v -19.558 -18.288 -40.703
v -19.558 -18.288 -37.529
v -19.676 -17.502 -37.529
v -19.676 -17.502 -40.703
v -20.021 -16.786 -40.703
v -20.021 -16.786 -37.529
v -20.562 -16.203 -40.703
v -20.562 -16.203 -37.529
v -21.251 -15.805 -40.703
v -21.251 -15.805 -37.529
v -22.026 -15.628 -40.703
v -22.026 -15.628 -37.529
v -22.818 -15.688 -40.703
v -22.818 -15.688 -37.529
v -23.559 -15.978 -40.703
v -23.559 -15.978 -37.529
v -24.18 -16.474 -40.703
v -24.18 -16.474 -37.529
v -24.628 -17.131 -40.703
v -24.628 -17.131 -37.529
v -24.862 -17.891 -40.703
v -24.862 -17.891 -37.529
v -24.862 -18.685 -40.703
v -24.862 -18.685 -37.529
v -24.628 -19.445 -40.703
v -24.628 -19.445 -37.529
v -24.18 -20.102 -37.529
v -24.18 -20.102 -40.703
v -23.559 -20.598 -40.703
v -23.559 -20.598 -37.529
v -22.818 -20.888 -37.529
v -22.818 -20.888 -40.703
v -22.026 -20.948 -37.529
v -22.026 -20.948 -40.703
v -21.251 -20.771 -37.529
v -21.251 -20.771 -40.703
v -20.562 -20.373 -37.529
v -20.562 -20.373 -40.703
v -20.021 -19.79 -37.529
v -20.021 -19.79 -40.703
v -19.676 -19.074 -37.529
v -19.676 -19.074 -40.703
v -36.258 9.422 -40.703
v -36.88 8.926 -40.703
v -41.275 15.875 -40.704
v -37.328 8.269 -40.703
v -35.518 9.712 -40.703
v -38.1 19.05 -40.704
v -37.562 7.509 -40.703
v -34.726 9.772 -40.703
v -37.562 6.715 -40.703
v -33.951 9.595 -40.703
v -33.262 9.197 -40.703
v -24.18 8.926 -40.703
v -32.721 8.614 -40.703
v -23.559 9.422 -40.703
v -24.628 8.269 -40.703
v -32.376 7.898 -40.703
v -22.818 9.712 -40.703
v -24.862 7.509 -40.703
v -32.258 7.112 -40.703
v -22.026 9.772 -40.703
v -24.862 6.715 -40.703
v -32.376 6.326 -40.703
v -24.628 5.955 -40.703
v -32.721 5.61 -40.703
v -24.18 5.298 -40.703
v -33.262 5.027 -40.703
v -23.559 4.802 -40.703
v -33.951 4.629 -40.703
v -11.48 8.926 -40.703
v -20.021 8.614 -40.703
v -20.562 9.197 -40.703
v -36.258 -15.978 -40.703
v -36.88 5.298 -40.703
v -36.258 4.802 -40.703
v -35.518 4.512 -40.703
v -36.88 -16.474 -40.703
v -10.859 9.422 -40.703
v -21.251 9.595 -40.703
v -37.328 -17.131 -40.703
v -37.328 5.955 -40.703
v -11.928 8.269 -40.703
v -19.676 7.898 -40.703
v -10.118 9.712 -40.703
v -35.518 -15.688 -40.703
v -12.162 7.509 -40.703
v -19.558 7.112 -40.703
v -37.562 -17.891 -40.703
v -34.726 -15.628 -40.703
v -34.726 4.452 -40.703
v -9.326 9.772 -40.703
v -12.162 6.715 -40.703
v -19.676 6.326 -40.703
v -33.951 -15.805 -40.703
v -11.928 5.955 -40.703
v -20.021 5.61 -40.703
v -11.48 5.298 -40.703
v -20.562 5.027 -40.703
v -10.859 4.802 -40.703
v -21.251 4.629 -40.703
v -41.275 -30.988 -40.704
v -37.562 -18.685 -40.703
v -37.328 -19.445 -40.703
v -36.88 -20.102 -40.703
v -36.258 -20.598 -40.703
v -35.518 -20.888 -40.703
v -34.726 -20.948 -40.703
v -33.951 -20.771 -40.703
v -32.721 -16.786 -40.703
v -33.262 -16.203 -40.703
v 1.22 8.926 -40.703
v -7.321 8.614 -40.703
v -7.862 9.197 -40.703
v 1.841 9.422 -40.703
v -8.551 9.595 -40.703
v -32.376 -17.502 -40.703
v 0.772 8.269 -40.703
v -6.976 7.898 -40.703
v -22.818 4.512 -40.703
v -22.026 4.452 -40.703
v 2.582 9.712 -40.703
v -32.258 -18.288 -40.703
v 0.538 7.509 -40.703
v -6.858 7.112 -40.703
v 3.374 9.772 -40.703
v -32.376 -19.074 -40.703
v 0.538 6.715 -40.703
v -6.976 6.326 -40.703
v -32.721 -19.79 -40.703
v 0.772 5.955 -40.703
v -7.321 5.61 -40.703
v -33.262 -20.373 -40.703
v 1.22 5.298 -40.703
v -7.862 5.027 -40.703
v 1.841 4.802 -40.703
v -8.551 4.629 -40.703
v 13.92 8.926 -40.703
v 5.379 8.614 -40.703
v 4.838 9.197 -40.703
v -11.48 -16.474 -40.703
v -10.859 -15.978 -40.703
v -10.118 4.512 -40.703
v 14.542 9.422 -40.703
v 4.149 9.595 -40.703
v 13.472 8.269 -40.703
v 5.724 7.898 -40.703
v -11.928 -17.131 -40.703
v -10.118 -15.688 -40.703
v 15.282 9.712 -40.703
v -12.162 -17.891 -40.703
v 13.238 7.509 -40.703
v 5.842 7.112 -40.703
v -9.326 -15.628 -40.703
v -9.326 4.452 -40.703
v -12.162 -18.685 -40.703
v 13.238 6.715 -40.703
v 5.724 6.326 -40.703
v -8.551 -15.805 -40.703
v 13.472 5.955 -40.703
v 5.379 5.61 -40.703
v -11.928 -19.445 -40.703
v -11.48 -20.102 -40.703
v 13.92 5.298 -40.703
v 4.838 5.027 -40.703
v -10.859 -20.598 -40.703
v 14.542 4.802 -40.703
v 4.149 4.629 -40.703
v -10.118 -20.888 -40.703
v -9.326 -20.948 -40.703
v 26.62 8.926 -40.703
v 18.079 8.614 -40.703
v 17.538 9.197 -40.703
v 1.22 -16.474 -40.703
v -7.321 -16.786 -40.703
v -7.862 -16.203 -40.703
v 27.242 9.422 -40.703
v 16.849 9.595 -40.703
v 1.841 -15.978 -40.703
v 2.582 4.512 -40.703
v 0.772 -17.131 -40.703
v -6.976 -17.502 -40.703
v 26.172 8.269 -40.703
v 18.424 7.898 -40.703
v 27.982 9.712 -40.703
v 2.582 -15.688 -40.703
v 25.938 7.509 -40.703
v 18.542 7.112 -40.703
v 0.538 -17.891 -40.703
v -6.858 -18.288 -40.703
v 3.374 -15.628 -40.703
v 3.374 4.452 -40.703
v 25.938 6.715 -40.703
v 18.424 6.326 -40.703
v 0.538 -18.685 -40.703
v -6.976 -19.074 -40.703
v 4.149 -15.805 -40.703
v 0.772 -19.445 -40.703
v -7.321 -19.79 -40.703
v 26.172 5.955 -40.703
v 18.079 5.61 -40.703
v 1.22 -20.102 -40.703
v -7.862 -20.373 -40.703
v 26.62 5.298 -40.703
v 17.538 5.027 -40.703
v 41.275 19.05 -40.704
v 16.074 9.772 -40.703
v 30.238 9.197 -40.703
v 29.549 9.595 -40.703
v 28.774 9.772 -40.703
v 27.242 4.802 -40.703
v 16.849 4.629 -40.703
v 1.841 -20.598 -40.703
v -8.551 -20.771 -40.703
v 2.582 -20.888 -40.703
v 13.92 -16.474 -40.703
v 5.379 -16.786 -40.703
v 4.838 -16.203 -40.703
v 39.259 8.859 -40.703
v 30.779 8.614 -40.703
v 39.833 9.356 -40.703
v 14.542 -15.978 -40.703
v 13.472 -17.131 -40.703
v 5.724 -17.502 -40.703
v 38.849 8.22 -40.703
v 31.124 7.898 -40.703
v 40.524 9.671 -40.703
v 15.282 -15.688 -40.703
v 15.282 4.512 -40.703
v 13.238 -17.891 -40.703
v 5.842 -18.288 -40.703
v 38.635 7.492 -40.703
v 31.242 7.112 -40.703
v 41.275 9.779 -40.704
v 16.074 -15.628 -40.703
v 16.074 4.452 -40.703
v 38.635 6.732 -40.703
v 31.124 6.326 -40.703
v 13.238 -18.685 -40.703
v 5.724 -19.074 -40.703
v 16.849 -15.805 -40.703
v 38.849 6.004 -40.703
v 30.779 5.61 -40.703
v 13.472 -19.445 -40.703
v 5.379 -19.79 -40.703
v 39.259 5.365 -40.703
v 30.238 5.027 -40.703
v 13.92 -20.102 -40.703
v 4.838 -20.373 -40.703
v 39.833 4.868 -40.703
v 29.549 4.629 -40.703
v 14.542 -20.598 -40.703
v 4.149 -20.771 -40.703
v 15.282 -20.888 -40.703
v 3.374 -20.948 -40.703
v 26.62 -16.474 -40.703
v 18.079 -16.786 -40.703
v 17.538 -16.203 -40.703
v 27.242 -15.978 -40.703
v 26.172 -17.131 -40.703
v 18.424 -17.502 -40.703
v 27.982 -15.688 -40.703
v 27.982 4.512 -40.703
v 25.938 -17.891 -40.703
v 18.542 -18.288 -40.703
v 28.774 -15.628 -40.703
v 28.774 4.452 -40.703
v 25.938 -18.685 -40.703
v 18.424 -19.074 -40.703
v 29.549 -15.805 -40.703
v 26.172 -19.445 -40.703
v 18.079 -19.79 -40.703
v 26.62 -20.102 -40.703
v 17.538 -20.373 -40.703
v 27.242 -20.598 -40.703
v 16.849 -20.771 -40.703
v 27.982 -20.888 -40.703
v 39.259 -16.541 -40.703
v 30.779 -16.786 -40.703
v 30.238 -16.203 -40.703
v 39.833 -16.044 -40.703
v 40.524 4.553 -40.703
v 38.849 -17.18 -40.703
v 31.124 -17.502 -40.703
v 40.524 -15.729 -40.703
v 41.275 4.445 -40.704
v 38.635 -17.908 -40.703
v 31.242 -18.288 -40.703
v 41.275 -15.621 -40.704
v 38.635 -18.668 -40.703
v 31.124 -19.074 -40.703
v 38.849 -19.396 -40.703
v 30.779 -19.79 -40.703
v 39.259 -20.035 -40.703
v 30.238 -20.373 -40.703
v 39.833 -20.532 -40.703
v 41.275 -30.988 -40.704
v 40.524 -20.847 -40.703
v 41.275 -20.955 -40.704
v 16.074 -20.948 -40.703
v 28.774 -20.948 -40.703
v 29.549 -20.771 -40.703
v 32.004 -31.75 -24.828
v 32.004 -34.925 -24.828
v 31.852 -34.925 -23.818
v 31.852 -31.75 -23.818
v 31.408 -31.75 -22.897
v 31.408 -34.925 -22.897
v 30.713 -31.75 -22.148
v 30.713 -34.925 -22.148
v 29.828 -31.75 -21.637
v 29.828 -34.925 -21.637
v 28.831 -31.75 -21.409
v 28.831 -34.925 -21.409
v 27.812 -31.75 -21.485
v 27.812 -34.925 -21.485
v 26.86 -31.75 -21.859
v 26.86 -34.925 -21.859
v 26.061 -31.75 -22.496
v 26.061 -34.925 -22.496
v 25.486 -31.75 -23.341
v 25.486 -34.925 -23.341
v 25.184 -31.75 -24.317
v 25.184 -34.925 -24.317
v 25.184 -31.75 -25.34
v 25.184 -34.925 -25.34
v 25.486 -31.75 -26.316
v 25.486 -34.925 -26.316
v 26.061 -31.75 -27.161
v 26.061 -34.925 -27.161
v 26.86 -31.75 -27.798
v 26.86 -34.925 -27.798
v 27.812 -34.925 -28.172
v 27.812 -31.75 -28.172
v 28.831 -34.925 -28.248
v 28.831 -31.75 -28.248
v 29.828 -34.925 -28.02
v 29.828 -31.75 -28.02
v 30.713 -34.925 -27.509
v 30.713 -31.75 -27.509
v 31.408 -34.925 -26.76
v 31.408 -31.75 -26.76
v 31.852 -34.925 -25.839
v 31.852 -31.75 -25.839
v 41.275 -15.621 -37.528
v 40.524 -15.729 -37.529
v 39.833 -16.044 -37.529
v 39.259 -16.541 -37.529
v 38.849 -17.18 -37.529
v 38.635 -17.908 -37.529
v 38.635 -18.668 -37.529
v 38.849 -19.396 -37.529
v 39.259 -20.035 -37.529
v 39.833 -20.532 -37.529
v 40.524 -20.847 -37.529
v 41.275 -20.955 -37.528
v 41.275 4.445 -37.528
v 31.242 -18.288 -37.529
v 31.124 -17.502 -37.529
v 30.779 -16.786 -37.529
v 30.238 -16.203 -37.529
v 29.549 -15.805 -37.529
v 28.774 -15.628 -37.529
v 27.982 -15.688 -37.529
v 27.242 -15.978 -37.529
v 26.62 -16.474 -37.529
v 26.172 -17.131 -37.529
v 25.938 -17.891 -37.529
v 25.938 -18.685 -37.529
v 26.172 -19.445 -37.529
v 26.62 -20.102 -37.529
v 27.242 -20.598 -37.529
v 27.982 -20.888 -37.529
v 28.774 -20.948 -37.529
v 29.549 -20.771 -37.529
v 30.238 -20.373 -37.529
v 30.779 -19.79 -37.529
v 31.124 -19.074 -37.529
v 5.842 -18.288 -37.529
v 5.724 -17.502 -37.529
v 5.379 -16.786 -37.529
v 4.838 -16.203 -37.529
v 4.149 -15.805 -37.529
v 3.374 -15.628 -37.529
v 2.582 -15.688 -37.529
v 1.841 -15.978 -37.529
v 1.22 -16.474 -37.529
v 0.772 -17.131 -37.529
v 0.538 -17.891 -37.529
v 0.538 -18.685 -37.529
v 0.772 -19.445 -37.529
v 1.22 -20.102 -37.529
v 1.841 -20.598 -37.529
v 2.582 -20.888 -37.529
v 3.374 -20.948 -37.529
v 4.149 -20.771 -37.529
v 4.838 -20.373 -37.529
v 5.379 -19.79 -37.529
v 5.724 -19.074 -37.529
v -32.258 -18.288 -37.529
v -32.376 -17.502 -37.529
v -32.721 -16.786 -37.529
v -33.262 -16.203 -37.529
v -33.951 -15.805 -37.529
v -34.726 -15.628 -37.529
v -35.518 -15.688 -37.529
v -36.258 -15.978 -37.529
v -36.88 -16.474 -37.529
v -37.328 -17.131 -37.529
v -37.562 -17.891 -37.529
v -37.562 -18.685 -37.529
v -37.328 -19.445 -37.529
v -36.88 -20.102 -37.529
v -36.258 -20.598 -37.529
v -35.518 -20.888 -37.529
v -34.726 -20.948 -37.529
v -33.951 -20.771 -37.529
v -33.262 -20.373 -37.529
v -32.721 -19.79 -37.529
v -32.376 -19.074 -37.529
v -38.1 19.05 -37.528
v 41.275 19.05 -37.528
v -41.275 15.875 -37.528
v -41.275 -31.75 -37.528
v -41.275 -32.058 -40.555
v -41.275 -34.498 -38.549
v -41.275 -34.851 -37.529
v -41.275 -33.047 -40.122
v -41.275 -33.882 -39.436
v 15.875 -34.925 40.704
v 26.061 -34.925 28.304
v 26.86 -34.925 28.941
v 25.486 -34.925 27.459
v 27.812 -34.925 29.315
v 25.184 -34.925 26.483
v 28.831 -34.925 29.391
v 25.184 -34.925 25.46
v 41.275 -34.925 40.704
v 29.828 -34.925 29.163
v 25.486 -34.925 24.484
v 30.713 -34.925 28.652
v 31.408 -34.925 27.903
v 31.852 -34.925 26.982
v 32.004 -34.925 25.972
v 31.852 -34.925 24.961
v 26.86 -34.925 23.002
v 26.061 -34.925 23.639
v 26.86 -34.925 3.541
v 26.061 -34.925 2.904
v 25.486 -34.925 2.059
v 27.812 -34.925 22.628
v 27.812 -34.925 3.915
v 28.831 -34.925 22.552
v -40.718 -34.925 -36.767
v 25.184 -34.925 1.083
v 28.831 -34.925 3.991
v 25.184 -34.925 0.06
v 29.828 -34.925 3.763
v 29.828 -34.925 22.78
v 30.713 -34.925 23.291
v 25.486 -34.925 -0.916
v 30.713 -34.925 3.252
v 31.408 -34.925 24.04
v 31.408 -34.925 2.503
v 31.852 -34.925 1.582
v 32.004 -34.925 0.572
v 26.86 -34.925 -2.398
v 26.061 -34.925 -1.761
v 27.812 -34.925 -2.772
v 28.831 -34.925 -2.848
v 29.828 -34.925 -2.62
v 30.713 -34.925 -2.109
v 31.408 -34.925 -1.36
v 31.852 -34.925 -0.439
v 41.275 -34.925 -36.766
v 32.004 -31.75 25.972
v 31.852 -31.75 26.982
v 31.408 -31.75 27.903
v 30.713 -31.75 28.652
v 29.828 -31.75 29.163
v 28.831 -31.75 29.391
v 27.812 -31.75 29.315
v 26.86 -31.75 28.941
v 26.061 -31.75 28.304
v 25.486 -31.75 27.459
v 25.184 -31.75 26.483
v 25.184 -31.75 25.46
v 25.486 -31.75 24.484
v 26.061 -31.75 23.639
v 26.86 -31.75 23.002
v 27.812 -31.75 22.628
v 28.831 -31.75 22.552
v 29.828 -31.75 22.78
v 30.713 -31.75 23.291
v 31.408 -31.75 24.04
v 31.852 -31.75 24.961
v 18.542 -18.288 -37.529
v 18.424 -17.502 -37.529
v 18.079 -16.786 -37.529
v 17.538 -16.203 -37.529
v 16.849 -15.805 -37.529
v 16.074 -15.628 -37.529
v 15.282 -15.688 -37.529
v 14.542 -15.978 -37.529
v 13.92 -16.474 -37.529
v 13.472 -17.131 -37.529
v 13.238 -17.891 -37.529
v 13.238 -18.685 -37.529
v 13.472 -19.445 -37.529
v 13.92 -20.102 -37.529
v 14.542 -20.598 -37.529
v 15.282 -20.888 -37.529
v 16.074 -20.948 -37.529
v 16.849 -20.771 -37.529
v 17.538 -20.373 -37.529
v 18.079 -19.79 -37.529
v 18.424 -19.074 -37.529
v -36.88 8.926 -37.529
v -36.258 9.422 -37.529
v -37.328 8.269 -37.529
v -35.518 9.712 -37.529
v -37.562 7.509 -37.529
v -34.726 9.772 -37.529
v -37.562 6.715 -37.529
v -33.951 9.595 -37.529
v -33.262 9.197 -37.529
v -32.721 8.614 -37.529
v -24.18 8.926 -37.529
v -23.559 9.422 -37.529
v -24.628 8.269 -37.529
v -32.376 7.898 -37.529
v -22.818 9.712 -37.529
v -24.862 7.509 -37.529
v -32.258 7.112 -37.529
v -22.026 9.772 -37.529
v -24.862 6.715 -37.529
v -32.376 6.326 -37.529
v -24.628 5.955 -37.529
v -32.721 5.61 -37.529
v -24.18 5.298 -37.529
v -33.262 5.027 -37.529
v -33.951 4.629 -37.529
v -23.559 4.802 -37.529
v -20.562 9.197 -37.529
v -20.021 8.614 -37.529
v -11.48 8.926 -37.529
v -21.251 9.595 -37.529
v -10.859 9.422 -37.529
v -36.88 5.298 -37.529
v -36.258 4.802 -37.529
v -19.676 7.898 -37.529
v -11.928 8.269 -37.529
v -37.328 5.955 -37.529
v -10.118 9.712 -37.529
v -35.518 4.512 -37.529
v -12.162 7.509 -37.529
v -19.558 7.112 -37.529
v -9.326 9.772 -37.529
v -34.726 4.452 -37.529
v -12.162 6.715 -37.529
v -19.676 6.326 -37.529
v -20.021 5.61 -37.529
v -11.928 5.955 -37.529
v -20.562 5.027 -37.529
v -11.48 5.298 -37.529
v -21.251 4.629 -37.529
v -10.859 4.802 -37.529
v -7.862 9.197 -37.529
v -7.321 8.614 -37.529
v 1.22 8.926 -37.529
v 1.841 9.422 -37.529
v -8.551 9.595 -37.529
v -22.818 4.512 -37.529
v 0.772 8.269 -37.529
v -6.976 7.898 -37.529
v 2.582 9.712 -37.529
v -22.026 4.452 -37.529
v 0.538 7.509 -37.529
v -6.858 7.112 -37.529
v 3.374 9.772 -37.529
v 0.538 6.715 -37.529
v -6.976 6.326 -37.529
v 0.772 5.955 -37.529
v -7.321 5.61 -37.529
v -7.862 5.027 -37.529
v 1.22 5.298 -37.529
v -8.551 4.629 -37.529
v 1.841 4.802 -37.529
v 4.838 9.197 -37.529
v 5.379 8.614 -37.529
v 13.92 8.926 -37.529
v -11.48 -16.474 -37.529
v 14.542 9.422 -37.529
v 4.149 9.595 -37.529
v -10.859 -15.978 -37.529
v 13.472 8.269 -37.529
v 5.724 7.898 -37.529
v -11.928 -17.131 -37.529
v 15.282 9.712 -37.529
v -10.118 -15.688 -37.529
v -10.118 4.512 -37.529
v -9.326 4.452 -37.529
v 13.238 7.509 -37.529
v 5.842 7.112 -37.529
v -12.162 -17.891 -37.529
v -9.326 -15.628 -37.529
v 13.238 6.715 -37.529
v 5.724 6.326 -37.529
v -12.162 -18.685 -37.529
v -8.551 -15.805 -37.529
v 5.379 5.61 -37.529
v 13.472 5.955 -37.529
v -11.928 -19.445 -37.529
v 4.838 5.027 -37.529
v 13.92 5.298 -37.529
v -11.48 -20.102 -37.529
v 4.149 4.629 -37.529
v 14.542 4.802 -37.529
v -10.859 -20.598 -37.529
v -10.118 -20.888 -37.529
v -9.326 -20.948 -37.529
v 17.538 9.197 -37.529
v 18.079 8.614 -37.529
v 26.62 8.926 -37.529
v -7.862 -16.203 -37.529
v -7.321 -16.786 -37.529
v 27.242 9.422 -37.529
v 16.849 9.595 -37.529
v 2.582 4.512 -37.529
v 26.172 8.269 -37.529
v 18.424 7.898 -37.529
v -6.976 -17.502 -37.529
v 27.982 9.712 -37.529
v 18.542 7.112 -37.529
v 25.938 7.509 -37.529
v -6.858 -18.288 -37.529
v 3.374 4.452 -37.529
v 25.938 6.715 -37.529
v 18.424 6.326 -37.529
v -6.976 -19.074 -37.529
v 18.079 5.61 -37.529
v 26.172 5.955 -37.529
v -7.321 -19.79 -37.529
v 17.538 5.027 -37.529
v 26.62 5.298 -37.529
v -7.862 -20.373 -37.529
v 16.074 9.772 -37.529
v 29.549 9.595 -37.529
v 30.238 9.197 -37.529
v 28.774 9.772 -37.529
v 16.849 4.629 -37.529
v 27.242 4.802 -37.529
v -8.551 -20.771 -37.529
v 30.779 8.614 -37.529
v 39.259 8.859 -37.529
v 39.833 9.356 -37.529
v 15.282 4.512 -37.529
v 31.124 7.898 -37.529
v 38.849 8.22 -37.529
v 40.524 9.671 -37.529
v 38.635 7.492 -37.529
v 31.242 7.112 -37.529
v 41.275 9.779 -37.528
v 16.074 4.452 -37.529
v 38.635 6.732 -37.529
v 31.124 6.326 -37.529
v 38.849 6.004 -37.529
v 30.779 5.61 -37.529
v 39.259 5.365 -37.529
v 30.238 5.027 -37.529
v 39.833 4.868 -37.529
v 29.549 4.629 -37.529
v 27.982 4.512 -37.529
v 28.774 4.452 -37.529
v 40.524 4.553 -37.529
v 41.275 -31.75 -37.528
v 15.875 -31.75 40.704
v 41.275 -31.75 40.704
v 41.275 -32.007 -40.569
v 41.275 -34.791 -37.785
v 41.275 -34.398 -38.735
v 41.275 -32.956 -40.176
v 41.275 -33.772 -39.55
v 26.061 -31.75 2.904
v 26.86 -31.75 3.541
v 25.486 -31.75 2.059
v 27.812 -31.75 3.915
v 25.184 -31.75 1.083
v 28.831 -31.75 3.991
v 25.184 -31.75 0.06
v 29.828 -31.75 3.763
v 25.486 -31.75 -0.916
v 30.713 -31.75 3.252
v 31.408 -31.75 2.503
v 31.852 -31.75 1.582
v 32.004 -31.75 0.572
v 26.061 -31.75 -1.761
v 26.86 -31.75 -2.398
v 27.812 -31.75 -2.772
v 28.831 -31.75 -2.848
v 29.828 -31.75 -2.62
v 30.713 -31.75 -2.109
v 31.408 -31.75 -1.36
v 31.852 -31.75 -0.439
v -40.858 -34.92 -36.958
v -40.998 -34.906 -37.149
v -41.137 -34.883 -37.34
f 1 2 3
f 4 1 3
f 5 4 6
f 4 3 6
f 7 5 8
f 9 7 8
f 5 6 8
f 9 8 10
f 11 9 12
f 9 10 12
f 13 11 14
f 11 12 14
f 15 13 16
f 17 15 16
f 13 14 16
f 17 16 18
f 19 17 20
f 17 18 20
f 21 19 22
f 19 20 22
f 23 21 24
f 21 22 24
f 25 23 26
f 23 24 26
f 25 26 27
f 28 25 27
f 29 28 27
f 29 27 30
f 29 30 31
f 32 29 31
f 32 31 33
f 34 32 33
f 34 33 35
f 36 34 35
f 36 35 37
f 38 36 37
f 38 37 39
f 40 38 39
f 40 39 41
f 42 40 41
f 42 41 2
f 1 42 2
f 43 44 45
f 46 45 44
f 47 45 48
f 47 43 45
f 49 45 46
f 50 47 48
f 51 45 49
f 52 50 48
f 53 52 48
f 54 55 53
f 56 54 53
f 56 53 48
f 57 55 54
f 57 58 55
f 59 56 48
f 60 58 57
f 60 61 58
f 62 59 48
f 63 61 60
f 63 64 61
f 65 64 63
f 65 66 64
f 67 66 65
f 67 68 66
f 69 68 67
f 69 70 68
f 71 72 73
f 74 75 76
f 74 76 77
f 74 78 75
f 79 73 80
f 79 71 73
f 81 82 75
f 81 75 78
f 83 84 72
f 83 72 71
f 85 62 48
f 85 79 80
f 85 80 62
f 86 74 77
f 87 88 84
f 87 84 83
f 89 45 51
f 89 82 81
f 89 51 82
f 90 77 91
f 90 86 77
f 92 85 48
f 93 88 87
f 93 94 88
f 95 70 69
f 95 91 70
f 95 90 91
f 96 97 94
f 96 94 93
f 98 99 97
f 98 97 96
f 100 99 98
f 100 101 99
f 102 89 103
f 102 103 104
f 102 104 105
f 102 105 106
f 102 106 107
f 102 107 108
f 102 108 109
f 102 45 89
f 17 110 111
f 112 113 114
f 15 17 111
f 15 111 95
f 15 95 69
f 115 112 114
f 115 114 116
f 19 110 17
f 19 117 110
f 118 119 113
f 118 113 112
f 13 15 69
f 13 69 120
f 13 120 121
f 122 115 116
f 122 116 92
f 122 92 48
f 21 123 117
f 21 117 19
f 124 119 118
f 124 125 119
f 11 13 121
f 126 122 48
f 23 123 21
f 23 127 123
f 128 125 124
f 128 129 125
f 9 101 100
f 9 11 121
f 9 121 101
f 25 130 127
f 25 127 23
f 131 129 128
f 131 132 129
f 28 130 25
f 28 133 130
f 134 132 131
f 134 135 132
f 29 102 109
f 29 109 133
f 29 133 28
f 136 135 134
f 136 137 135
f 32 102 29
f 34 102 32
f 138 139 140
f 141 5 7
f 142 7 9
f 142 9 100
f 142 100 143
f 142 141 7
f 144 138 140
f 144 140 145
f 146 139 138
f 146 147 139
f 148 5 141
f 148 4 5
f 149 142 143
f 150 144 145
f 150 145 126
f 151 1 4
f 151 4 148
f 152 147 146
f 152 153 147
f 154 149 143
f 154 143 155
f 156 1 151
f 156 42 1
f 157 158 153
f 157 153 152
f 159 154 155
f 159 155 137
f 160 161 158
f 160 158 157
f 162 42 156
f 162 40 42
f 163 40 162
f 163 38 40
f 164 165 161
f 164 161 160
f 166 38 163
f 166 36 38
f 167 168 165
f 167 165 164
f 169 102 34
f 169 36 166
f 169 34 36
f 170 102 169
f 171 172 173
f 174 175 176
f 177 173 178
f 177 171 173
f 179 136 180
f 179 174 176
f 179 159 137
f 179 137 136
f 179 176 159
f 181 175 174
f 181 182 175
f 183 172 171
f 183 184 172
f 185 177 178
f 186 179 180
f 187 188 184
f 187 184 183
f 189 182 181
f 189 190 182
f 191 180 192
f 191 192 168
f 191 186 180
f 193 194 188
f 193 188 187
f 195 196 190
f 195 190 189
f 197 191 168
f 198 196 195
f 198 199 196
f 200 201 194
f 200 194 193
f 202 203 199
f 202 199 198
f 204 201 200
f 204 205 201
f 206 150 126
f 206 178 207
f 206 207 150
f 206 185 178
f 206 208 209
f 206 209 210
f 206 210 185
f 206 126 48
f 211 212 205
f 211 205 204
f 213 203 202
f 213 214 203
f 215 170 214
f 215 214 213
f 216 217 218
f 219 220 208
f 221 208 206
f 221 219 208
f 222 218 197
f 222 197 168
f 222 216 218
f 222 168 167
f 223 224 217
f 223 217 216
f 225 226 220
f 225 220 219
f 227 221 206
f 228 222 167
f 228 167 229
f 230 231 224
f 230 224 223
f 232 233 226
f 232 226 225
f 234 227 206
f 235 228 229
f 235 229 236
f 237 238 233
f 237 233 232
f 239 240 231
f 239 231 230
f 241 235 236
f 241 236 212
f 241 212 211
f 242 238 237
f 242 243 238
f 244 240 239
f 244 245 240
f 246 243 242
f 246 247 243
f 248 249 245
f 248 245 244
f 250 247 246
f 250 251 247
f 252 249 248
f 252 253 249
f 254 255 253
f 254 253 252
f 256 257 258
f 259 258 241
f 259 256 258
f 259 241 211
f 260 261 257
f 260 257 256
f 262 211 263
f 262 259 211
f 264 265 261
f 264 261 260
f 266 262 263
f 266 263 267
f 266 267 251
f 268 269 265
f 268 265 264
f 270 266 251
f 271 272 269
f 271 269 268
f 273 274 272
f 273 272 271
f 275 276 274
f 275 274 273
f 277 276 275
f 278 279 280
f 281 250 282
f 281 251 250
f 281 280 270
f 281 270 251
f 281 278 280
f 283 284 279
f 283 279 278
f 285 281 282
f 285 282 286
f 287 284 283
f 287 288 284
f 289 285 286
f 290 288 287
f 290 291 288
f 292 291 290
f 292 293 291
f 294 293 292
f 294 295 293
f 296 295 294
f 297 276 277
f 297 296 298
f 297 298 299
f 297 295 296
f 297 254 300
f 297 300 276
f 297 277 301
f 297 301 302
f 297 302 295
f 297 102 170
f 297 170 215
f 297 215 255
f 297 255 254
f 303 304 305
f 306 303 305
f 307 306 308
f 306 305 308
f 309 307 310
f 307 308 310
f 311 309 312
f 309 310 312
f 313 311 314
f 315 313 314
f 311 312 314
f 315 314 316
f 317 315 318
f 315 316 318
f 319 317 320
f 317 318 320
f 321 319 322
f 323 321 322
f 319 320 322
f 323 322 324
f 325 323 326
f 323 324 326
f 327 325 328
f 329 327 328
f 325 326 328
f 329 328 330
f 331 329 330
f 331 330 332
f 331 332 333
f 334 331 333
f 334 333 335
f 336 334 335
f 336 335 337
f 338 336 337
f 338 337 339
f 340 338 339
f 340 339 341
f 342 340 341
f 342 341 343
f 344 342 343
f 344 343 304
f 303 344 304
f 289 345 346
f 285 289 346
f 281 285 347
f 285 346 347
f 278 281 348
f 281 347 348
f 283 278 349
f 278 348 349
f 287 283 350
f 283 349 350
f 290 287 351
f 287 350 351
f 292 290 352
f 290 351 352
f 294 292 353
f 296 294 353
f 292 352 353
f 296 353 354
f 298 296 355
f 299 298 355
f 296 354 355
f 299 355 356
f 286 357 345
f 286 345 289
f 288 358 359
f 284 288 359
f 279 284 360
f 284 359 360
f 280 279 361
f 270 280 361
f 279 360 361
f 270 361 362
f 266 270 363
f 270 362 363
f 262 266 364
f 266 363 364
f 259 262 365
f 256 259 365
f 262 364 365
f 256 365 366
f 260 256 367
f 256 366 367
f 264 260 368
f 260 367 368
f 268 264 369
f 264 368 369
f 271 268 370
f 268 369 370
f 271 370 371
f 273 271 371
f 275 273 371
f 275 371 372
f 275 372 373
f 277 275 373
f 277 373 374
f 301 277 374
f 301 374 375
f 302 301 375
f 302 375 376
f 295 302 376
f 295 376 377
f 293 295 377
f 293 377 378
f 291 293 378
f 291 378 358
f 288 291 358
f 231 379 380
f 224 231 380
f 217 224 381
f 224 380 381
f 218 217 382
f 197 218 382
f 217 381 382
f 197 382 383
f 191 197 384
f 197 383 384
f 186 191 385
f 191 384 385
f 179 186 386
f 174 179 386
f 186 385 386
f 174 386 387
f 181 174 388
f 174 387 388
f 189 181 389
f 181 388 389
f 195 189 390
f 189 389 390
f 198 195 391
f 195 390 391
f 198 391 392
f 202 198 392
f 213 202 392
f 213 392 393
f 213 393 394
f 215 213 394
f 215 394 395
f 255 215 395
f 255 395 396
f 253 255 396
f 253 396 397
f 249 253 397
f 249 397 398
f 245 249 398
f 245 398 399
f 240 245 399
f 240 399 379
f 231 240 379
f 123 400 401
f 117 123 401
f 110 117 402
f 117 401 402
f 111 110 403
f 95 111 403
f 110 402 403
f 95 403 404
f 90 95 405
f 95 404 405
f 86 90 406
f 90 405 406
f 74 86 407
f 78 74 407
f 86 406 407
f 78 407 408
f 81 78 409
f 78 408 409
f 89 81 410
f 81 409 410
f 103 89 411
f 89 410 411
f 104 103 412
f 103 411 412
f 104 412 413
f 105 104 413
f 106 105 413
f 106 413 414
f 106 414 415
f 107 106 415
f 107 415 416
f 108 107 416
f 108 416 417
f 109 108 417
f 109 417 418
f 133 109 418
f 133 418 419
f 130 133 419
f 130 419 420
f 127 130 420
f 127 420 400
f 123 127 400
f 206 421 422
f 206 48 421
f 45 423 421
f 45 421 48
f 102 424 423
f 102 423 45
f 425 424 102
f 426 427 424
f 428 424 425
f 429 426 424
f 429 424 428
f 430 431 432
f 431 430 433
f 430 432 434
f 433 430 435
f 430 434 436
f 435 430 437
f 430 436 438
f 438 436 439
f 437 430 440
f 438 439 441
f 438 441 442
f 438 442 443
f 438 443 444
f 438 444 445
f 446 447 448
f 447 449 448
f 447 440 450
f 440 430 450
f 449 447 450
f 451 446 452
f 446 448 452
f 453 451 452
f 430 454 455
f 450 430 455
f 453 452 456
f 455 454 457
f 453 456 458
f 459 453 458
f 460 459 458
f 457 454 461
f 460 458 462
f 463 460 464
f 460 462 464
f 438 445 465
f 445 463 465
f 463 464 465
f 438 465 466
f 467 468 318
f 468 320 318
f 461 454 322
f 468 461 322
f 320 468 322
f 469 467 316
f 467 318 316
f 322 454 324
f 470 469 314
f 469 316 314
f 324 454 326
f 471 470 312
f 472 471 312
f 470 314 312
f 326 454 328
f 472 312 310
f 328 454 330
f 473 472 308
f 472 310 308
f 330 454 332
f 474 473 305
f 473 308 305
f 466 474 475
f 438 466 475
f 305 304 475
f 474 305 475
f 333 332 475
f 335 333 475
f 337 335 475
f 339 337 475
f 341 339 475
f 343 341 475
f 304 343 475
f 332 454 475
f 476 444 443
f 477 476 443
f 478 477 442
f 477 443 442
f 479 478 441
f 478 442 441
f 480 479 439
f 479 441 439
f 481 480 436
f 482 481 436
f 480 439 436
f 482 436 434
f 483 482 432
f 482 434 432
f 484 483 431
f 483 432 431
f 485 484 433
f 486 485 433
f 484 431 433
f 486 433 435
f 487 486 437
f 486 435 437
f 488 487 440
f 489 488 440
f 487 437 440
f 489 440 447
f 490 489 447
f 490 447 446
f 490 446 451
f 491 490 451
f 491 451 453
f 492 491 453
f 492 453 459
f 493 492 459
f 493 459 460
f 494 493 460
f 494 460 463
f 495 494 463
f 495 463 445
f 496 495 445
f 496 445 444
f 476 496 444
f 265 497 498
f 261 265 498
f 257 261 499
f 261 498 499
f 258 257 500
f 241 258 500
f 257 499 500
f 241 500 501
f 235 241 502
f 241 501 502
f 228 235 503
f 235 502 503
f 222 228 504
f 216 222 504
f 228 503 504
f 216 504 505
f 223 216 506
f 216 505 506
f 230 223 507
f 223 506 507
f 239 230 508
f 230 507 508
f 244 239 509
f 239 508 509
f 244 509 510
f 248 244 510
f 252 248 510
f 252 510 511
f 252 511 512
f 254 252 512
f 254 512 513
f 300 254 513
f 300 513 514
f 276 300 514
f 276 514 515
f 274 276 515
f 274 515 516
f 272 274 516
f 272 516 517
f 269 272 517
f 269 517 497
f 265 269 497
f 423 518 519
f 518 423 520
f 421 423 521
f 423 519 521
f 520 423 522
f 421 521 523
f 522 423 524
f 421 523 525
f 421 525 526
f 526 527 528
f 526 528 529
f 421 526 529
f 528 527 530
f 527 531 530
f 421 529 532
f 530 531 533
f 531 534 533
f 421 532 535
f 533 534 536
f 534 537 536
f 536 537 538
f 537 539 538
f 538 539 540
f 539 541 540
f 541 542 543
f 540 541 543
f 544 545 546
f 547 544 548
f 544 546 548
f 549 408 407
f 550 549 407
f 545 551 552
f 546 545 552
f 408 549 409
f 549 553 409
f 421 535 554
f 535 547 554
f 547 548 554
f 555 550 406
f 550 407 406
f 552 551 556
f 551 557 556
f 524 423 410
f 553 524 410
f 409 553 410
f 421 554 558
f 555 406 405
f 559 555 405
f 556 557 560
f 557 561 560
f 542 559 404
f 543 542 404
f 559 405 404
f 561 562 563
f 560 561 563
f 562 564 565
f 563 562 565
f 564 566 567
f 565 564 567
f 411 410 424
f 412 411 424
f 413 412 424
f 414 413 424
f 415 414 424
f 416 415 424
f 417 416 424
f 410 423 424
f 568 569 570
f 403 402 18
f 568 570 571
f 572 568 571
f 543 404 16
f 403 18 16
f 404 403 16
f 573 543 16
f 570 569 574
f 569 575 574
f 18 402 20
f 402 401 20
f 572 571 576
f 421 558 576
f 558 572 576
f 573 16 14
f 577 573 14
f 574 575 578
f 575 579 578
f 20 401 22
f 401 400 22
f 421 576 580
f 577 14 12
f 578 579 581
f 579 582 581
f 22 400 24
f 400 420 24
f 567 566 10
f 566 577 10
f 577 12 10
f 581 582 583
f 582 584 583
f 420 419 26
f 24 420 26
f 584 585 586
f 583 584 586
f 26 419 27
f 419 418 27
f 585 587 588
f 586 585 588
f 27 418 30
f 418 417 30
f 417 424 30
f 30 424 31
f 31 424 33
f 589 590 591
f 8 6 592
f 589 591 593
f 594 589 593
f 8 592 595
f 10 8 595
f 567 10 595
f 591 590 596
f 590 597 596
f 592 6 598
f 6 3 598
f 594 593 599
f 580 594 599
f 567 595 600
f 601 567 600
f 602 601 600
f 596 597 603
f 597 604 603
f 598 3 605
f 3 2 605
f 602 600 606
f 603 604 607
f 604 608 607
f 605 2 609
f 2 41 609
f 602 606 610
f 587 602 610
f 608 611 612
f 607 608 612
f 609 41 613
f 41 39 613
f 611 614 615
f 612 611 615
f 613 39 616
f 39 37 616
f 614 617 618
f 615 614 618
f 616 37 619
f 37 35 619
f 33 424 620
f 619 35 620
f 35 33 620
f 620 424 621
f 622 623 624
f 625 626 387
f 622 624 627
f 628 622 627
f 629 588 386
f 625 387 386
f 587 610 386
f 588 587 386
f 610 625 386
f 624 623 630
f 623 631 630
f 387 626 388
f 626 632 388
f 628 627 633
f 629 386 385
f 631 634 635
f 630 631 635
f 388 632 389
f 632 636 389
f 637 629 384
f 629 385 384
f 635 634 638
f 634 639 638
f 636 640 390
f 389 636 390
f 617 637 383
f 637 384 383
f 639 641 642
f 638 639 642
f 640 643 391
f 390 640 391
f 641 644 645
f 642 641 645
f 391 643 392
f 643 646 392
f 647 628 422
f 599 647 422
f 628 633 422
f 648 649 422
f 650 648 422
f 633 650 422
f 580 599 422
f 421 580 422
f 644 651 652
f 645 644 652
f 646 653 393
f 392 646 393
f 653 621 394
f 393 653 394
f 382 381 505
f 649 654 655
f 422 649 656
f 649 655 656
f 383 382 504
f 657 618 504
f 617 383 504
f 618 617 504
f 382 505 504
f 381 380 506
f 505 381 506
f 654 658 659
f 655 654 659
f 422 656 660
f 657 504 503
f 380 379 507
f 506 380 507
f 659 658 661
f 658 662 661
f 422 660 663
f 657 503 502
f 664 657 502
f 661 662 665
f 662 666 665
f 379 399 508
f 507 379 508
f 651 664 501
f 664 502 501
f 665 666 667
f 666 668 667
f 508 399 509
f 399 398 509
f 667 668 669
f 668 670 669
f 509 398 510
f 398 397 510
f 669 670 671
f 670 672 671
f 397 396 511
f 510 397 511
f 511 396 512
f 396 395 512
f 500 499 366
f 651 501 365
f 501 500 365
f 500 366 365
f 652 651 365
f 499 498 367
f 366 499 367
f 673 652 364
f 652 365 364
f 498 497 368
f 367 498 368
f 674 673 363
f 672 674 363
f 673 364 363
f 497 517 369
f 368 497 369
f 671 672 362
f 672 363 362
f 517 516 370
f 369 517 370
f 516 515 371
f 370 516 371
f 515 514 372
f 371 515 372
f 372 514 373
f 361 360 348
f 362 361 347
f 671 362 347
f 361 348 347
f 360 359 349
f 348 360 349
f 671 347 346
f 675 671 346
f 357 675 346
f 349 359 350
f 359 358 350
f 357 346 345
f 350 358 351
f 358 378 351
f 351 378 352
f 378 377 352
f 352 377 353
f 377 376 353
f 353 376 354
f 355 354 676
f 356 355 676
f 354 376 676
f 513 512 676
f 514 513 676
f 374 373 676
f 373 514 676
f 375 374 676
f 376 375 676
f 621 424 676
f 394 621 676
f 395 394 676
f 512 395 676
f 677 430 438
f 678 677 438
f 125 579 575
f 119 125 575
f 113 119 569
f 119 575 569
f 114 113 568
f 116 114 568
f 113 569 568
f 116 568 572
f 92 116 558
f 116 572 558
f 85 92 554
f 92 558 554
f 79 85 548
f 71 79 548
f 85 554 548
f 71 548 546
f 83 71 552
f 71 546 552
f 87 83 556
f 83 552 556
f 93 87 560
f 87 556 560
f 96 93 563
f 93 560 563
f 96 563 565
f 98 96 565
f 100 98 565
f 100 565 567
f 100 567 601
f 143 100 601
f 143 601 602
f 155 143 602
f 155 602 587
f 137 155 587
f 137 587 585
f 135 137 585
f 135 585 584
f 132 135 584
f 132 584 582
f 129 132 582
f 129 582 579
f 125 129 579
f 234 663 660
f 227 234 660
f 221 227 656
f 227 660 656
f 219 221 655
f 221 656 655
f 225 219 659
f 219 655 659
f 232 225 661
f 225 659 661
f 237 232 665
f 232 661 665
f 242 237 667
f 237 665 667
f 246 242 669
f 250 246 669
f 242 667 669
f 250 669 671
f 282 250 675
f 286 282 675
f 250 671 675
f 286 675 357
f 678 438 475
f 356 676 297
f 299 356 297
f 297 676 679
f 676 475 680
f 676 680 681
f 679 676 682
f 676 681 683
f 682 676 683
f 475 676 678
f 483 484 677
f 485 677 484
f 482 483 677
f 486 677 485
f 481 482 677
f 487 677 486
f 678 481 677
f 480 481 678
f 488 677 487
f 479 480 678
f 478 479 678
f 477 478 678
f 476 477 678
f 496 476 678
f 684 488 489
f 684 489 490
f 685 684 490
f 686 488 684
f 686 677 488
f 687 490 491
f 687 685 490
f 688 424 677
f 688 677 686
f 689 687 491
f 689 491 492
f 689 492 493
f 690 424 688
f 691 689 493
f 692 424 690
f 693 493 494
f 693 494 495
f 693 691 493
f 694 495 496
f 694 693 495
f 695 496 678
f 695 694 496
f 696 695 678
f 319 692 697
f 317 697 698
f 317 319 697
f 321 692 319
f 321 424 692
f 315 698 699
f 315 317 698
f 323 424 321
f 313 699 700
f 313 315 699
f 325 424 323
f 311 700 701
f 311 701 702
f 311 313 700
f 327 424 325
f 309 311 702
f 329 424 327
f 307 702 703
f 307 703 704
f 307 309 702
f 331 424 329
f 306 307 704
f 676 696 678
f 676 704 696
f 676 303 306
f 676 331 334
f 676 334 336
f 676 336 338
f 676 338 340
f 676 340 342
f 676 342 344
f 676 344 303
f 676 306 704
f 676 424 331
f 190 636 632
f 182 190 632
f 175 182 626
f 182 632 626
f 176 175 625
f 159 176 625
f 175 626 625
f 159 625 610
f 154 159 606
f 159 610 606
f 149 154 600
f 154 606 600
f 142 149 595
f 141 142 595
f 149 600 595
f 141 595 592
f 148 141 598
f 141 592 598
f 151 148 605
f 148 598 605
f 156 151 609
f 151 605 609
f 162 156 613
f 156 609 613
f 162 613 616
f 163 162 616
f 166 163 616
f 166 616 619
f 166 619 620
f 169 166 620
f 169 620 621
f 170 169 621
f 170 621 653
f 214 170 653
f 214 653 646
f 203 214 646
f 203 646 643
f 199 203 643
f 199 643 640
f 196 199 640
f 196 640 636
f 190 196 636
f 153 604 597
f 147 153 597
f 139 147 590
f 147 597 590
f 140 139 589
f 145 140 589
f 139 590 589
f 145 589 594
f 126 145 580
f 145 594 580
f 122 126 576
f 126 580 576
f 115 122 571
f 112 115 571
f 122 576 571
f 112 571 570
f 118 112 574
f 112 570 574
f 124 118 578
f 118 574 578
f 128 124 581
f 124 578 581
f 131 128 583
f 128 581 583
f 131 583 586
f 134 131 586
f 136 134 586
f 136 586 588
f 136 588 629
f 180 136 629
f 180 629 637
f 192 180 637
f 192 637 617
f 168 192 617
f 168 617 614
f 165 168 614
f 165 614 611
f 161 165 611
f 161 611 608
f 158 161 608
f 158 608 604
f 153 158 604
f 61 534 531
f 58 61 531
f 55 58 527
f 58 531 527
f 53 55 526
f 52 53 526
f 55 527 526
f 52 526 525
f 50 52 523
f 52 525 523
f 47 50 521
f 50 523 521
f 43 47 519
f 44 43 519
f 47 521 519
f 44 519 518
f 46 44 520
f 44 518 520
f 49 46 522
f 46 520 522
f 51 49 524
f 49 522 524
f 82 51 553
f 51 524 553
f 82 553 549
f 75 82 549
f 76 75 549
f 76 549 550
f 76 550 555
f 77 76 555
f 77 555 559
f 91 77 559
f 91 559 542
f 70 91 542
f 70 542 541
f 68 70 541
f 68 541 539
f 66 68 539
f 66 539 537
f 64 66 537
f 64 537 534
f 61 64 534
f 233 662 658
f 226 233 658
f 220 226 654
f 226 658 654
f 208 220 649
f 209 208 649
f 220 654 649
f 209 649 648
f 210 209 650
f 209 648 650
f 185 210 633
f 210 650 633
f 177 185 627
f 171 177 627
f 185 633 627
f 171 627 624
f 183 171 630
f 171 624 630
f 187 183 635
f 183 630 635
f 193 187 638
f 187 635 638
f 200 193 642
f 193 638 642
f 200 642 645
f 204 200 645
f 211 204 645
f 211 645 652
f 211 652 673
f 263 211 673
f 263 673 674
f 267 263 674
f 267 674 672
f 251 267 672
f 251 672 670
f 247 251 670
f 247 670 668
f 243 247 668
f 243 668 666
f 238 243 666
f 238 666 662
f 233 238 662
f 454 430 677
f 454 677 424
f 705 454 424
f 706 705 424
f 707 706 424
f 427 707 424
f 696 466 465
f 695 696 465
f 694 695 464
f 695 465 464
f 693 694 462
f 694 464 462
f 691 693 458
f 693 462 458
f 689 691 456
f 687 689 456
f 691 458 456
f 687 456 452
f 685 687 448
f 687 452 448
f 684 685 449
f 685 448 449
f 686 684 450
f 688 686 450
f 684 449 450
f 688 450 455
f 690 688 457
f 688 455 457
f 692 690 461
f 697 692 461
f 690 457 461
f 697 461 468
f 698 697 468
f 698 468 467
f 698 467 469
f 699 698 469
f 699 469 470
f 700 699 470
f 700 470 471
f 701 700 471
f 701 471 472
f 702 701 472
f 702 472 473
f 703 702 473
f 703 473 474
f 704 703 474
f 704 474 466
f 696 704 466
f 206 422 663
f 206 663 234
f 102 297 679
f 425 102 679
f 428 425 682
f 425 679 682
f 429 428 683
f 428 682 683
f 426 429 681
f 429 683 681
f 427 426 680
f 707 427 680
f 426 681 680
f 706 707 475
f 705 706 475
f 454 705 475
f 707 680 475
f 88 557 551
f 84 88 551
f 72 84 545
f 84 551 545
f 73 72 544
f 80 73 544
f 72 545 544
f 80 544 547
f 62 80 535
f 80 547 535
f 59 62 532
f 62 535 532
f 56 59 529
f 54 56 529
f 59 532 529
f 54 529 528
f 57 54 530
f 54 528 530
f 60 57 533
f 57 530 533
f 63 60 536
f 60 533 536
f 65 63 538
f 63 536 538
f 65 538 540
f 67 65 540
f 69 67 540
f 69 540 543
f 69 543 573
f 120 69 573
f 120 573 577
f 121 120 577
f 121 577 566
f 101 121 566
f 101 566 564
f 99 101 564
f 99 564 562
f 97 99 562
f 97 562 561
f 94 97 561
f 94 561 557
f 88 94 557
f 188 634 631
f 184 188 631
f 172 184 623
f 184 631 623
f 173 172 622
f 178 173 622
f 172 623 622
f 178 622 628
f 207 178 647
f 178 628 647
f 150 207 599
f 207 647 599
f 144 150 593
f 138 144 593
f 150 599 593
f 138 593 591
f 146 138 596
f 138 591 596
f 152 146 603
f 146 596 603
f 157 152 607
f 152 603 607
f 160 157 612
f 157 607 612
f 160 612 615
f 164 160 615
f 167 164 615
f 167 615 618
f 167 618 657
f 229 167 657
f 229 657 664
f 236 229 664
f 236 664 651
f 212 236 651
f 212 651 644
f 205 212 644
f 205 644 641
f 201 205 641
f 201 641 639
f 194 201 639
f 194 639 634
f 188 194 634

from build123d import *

# Parameters (mm, degrees)
BOSS_EXTRUDE1_START    = -34.925
SKETCH1_W              = 82.55
SKETCH1_H              = 81.407
BOSS_EXTRUDE1_DEPTH    = 3.175
SKETCH3_W              = 82.55
SKETCH3_H              = 3.175
BOSS_EXTRUDE2_DEPTH    = 50.8
F_10_CLEARANCE_HOLE2_D = 5.334
CHAMFER1_SIZE          = 3.175
FILLET2_R              = 3.937
SKETCH9_R              = 3.429
CUT_EXTRUDE2_DEPTH     = 54.975


with BuildPart() as part:
    # Sketch1 → Boss-Extrude1 (new body)
    with BuildSketch(Plane(origin=(0, 0, 0), x_dir=(1, 0, 0), z_dir=(0, 1, 0)).offset(BOSS_EXTRUDE1_START)):
        Rectangle(SKETCH1_W, SKETCH1_H)
    extrude(amount=BOSS_EXTRUDE1_DEPTH)

    # Sketch3 → Boss-Extrude2 (add)
    with BuildSketch(Plane(origin=(0, -31.75, 0), x_dir=(1, 0, 0), z_dir=(0, 1, 0))):
        with Locations((0, 39.116)):
            Rectangle(SKETCH3_W, SKETCH3_H)
    extrude(amount=BOSS_EXTRUDE2_DEPTH)

    # #10 Clearance Hole2 (through all)
    with Locations(Plane(origin=(0, 0, -40.7035), x_dir=(-1, 0, 0), z_dir=(0, 0, -1))):
        with Locations((22.225, 7.112), (9.525, 7.112), (-3.175, 7.112), (-15.875, 7.112), (-28.575, 7.112), (22.225, -18.288), (9.525, -18.288), (-3.175, -18.288), (-15.875, -18.288), (-28.575, -18.288), (34.925, 7.112), (34.925, -18.288), (-41.275, 7.112), (-41.275, -18.288)):
            Hole(F_10_CLEARANCE_HOLE2_D / 2)

    # Chamfer1
    chamfer1_edges = [part.edges().sort_by_distance(p)[0] for p in [
        (-41.275, 19.05, -39.116),
    ]]
    chamfer(chamfer1_edges, length=CHAMFER1_SIZE)

    # Fillet2
    fillet2_edges = [part.edges().sort_by_distance(p)[0] for p in [
        (0, -34.925, -40.7035),
    ]]
    fillet(fillet2_edges, radius=FILLET2_R)

    # Sketch9 → Cut-Extrude2 (cut, through all)
    with BuildSketch(Plane.XZ.offset(34.925)):
        with Locations((28.575, -24.8285)):
            Circle(SKETCH9_R)
        with Locations((28.575, 0.5715)):
            Circle(SKETCH9_R)
        with Locations((28.575, 25.9715)):
            Circle(SKETCH9_R)
        Polygon((-41.275, -37.5285), (-41.275, 40.7035), (15.875, 40.7035), align=None)
    extrude(amount=-CUT_EXTRUDE2_DEPTH, mode=Mode.SUBTRACT)


solid = part.part
